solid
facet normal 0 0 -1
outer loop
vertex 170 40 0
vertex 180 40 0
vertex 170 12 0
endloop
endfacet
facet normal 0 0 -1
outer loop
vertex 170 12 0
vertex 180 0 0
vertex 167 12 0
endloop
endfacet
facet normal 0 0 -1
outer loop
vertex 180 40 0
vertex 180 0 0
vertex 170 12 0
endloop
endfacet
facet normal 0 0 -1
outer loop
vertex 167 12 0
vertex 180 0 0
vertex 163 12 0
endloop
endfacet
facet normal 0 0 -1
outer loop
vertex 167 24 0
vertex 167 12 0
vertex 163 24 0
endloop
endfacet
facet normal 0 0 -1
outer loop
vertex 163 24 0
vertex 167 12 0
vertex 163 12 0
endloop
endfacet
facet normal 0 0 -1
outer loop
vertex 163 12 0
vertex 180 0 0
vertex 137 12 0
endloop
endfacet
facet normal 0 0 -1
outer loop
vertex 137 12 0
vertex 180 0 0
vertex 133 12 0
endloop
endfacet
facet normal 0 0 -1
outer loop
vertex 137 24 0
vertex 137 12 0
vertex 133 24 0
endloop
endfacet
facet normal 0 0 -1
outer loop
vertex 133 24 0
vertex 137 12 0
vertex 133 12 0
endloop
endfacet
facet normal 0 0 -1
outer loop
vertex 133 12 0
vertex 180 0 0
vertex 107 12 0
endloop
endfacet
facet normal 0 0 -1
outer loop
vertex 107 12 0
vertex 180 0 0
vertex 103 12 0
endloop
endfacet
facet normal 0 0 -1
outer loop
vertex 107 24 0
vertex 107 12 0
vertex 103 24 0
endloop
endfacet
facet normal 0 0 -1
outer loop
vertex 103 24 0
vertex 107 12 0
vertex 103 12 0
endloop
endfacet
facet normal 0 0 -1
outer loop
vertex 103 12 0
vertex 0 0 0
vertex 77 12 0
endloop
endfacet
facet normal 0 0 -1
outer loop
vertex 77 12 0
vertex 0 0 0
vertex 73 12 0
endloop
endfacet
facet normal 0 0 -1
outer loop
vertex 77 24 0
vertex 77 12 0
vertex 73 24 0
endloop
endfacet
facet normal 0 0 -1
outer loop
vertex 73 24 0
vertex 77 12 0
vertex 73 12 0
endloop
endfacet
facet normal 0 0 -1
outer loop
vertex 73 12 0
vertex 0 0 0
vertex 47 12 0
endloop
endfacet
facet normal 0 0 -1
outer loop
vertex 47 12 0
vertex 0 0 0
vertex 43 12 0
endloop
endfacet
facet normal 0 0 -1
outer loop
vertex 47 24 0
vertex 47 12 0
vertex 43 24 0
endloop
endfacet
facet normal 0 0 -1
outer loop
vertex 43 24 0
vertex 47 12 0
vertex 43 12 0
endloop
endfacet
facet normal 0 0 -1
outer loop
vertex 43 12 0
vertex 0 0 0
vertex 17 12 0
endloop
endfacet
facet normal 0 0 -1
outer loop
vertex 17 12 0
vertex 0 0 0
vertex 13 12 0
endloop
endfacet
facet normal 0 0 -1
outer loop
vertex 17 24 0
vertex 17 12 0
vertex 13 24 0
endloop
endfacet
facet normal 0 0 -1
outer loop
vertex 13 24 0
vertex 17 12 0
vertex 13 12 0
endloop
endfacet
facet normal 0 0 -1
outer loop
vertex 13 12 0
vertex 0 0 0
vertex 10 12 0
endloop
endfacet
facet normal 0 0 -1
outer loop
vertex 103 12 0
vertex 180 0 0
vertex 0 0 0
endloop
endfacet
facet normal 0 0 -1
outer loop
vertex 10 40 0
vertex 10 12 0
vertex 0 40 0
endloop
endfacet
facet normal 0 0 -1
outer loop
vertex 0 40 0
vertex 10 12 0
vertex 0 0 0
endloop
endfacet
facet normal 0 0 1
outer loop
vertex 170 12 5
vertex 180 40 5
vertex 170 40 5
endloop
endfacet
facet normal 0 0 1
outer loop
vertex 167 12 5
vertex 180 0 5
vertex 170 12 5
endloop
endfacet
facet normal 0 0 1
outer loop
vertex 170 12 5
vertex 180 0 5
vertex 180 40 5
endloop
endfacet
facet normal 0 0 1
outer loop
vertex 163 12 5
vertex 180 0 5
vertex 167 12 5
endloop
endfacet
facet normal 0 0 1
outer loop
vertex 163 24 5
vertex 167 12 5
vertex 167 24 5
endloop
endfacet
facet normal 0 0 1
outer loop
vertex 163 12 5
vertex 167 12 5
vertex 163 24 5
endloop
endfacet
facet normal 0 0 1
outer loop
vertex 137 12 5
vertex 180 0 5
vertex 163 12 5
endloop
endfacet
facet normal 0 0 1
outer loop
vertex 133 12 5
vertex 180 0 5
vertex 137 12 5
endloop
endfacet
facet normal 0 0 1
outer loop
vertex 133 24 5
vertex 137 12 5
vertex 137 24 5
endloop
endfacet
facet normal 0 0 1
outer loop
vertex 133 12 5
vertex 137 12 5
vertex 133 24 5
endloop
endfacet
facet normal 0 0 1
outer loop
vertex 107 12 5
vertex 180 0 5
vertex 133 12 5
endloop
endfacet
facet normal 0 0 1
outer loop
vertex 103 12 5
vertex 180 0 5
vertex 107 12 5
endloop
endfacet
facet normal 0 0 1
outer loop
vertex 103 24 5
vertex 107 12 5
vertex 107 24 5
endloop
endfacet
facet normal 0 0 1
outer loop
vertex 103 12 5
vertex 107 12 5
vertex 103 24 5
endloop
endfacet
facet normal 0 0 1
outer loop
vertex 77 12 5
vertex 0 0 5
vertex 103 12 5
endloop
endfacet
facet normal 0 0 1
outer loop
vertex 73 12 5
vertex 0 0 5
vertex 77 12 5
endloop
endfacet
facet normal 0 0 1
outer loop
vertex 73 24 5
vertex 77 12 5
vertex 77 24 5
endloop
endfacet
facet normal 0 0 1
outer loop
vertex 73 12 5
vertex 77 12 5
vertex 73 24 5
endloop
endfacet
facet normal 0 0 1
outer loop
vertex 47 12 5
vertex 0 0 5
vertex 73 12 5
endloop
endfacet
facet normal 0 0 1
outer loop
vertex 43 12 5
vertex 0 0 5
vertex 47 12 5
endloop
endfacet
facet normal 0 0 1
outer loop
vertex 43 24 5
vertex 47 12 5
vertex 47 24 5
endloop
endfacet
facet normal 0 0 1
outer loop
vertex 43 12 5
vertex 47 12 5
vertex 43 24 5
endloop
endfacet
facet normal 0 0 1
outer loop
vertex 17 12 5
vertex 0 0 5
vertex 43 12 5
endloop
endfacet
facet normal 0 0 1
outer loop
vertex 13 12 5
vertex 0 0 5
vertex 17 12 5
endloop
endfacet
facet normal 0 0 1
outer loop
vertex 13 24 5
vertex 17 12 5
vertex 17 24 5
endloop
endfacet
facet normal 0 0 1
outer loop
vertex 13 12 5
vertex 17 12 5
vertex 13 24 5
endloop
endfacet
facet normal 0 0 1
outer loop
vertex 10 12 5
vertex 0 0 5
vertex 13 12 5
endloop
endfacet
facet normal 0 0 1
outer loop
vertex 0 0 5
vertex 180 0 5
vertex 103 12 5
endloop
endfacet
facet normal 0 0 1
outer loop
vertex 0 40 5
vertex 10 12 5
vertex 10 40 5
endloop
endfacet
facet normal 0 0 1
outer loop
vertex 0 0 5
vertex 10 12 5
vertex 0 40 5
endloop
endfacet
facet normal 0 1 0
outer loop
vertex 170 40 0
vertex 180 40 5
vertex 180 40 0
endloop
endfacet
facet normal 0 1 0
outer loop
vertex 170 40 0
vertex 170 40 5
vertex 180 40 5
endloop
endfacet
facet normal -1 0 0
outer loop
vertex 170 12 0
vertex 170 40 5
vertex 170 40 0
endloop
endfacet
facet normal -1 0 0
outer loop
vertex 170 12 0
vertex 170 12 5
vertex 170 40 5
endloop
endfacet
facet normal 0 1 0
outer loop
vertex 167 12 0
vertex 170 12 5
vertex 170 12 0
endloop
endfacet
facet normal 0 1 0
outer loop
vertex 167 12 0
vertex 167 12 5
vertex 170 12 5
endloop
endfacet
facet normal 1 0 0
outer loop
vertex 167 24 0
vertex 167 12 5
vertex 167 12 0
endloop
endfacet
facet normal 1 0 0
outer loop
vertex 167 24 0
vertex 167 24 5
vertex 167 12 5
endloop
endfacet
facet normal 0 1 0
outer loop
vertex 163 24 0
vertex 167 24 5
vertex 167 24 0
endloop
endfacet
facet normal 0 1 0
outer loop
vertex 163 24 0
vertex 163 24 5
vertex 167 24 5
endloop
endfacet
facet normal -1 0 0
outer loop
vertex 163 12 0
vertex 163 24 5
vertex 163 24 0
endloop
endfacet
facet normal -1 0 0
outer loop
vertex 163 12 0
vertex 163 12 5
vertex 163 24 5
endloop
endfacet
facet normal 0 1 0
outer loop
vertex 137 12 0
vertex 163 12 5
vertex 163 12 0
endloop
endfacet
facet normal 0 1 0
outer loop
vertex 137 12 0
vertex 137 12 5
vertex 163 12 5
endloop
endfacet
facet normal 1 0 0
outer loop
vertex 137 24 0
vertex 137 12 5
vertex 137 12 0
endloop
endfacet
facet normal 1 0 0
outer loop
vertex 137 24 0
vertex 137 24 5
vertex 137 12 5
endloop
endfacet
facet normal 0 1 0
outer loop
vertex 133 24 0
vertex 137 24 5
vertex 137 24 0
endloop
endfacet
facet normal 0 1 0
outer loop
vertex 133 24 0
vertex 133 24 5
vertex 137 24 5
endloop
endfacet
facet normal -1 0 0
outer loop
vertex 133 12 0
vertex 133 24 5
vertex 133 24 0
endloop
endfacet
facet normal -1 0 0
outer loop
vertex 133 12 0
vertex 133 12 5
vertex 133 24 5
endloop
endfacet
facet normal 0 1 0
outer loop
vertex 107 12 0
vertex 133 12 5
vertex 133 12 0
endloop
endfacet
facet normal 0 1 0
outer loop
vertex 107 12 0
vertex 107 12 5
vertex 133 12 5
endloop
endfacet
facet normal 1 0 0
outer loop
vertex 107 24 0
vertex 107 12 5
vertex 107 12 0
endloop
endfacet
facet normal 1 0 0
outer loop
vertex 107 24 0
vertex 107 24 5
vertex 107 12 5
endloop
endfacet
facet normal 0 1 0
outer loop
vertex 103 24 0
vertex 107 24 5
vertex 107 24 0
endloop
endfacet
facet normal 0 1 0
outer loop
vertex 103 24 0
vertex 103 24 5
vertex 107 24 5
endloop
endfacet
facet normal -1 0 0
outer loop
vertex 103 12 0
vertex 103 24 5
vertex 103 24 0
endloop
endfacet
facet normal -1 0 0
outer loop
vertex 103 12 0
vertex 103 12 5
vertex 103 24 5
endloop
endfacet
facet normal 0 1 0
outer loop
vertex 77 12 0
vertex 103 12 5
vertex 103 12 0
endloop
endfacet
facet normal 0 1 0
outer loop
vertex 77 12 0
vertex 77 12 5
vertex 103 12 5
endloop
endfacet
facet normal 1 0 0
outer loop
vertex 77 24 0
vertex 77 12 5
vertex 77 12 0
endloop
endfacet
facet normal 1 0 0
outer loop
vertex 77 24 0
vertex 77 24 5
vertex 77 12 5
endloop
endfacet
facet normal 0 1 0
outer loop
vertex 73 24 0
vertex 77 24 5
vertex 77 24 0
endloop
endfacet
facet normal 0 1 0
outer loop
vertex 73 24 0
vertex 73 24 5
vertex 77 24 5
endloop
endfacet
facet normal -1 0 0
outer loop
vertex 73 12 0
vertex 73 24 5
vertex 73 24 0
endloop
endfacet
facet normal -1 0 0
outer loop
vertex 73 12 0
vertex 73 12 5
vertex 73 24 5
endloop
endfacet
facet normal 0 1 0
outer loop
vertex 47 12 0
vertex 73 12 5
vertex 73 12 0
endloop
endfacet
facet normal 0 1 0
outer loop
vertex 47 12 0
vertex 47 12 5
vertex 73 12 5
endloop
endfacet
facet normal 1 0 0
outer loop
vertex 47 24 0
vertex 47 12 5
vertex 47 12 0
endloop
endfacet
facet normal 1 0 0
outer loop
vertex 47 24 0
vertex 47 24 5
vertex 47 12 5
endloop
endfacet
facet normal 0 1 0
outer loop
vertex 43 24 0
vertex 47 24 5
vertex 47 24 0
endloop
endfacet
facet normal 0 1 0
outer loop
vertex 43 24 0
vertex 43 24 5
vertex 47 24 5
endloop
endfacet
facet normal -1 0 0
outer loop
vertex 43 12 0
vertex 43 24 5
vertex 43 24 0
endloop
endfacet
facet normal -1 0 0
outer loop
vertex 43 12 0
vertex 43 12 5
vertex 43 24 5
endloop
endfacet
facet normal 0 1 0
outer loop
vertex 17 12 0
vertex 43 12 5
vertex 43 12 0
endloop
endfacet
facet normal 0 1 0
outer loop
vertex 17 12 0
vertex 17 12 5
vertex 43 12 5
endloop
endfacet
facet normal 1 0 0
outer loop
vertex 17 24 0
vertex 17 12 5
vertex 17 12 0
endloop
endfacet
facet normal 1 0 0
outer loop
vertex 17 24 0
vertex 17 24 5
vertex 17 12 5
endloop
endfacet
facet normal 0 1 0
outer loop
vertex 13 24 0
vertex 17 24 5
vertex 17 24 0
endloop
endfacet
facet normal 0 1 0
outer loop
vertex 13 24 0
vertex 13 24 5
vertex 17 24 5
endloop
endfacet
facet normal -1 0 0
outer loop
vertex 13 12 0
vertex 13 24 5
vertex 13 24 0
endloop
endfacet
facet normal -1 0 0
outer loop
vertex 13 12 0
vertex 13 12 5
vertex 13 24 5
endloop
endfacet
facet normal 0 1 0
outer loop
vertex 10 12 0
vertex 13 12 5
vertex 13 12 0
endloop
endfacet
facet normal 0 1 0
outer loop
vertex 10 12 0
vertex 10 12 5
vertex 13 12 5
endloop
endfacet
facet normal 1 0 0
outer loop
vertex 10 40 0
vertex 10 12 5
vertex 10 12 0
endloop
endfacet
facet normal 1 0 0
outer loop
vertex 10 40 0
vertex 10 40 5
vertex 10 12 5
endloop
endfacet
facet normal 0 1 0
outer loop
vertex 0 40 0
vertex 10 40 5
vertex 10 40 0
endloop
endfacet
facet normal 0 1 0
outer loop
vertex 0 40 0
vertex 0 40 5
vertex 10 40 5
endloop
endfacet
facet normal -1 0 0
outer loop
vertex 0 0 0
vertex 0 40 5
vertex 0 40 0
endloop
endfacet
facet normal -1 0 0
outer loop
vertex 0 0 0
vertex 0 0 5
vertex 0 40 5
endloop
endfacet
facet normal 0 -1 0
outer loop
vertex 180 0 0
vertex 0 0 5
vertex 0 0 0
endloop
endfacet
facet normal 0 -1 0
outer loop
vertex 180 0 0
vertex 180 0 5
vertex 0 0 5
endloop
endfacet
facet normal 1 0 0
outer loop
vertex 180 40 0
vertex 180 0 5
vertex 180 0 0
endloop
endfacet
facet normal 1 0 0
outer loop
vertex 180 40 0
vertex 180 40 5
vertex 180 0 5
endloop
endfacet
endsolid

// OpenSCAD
$fn = 32;

// ----------------------------------------------------------------------
// Guard grille: 6 slats over a 180 x 40 mm plate
// ----------------------------------------------------------------------

// --- parameters (mm) ---
profile_height = 5;       // extrusion height
profile_points = 32;      // points of the closed outline

profile = [[0, 0], [180, 0], [180, 40], [170, 40], [170, 12], [167, 12], [167, 24], [163, 24], [163, 12], [137, 12], [137, 24], [133, 24], [133, 12], [107, 12], [107, 24], [103, 24], [103, 12], [77, 12], [77, 24], [73, 24], [73, 12], [47, 12], [47, 24], [43, 24], [43, 12], [17, 12], [17, 24], [13, 24], [13, 12], [10, 12], [10, 40], [0, 40]];  // single closed polygon, 32 points, counter clockwise

// --- the one profile operation ---
linear_extrude(height = profile_height) polygon(points = profile);
